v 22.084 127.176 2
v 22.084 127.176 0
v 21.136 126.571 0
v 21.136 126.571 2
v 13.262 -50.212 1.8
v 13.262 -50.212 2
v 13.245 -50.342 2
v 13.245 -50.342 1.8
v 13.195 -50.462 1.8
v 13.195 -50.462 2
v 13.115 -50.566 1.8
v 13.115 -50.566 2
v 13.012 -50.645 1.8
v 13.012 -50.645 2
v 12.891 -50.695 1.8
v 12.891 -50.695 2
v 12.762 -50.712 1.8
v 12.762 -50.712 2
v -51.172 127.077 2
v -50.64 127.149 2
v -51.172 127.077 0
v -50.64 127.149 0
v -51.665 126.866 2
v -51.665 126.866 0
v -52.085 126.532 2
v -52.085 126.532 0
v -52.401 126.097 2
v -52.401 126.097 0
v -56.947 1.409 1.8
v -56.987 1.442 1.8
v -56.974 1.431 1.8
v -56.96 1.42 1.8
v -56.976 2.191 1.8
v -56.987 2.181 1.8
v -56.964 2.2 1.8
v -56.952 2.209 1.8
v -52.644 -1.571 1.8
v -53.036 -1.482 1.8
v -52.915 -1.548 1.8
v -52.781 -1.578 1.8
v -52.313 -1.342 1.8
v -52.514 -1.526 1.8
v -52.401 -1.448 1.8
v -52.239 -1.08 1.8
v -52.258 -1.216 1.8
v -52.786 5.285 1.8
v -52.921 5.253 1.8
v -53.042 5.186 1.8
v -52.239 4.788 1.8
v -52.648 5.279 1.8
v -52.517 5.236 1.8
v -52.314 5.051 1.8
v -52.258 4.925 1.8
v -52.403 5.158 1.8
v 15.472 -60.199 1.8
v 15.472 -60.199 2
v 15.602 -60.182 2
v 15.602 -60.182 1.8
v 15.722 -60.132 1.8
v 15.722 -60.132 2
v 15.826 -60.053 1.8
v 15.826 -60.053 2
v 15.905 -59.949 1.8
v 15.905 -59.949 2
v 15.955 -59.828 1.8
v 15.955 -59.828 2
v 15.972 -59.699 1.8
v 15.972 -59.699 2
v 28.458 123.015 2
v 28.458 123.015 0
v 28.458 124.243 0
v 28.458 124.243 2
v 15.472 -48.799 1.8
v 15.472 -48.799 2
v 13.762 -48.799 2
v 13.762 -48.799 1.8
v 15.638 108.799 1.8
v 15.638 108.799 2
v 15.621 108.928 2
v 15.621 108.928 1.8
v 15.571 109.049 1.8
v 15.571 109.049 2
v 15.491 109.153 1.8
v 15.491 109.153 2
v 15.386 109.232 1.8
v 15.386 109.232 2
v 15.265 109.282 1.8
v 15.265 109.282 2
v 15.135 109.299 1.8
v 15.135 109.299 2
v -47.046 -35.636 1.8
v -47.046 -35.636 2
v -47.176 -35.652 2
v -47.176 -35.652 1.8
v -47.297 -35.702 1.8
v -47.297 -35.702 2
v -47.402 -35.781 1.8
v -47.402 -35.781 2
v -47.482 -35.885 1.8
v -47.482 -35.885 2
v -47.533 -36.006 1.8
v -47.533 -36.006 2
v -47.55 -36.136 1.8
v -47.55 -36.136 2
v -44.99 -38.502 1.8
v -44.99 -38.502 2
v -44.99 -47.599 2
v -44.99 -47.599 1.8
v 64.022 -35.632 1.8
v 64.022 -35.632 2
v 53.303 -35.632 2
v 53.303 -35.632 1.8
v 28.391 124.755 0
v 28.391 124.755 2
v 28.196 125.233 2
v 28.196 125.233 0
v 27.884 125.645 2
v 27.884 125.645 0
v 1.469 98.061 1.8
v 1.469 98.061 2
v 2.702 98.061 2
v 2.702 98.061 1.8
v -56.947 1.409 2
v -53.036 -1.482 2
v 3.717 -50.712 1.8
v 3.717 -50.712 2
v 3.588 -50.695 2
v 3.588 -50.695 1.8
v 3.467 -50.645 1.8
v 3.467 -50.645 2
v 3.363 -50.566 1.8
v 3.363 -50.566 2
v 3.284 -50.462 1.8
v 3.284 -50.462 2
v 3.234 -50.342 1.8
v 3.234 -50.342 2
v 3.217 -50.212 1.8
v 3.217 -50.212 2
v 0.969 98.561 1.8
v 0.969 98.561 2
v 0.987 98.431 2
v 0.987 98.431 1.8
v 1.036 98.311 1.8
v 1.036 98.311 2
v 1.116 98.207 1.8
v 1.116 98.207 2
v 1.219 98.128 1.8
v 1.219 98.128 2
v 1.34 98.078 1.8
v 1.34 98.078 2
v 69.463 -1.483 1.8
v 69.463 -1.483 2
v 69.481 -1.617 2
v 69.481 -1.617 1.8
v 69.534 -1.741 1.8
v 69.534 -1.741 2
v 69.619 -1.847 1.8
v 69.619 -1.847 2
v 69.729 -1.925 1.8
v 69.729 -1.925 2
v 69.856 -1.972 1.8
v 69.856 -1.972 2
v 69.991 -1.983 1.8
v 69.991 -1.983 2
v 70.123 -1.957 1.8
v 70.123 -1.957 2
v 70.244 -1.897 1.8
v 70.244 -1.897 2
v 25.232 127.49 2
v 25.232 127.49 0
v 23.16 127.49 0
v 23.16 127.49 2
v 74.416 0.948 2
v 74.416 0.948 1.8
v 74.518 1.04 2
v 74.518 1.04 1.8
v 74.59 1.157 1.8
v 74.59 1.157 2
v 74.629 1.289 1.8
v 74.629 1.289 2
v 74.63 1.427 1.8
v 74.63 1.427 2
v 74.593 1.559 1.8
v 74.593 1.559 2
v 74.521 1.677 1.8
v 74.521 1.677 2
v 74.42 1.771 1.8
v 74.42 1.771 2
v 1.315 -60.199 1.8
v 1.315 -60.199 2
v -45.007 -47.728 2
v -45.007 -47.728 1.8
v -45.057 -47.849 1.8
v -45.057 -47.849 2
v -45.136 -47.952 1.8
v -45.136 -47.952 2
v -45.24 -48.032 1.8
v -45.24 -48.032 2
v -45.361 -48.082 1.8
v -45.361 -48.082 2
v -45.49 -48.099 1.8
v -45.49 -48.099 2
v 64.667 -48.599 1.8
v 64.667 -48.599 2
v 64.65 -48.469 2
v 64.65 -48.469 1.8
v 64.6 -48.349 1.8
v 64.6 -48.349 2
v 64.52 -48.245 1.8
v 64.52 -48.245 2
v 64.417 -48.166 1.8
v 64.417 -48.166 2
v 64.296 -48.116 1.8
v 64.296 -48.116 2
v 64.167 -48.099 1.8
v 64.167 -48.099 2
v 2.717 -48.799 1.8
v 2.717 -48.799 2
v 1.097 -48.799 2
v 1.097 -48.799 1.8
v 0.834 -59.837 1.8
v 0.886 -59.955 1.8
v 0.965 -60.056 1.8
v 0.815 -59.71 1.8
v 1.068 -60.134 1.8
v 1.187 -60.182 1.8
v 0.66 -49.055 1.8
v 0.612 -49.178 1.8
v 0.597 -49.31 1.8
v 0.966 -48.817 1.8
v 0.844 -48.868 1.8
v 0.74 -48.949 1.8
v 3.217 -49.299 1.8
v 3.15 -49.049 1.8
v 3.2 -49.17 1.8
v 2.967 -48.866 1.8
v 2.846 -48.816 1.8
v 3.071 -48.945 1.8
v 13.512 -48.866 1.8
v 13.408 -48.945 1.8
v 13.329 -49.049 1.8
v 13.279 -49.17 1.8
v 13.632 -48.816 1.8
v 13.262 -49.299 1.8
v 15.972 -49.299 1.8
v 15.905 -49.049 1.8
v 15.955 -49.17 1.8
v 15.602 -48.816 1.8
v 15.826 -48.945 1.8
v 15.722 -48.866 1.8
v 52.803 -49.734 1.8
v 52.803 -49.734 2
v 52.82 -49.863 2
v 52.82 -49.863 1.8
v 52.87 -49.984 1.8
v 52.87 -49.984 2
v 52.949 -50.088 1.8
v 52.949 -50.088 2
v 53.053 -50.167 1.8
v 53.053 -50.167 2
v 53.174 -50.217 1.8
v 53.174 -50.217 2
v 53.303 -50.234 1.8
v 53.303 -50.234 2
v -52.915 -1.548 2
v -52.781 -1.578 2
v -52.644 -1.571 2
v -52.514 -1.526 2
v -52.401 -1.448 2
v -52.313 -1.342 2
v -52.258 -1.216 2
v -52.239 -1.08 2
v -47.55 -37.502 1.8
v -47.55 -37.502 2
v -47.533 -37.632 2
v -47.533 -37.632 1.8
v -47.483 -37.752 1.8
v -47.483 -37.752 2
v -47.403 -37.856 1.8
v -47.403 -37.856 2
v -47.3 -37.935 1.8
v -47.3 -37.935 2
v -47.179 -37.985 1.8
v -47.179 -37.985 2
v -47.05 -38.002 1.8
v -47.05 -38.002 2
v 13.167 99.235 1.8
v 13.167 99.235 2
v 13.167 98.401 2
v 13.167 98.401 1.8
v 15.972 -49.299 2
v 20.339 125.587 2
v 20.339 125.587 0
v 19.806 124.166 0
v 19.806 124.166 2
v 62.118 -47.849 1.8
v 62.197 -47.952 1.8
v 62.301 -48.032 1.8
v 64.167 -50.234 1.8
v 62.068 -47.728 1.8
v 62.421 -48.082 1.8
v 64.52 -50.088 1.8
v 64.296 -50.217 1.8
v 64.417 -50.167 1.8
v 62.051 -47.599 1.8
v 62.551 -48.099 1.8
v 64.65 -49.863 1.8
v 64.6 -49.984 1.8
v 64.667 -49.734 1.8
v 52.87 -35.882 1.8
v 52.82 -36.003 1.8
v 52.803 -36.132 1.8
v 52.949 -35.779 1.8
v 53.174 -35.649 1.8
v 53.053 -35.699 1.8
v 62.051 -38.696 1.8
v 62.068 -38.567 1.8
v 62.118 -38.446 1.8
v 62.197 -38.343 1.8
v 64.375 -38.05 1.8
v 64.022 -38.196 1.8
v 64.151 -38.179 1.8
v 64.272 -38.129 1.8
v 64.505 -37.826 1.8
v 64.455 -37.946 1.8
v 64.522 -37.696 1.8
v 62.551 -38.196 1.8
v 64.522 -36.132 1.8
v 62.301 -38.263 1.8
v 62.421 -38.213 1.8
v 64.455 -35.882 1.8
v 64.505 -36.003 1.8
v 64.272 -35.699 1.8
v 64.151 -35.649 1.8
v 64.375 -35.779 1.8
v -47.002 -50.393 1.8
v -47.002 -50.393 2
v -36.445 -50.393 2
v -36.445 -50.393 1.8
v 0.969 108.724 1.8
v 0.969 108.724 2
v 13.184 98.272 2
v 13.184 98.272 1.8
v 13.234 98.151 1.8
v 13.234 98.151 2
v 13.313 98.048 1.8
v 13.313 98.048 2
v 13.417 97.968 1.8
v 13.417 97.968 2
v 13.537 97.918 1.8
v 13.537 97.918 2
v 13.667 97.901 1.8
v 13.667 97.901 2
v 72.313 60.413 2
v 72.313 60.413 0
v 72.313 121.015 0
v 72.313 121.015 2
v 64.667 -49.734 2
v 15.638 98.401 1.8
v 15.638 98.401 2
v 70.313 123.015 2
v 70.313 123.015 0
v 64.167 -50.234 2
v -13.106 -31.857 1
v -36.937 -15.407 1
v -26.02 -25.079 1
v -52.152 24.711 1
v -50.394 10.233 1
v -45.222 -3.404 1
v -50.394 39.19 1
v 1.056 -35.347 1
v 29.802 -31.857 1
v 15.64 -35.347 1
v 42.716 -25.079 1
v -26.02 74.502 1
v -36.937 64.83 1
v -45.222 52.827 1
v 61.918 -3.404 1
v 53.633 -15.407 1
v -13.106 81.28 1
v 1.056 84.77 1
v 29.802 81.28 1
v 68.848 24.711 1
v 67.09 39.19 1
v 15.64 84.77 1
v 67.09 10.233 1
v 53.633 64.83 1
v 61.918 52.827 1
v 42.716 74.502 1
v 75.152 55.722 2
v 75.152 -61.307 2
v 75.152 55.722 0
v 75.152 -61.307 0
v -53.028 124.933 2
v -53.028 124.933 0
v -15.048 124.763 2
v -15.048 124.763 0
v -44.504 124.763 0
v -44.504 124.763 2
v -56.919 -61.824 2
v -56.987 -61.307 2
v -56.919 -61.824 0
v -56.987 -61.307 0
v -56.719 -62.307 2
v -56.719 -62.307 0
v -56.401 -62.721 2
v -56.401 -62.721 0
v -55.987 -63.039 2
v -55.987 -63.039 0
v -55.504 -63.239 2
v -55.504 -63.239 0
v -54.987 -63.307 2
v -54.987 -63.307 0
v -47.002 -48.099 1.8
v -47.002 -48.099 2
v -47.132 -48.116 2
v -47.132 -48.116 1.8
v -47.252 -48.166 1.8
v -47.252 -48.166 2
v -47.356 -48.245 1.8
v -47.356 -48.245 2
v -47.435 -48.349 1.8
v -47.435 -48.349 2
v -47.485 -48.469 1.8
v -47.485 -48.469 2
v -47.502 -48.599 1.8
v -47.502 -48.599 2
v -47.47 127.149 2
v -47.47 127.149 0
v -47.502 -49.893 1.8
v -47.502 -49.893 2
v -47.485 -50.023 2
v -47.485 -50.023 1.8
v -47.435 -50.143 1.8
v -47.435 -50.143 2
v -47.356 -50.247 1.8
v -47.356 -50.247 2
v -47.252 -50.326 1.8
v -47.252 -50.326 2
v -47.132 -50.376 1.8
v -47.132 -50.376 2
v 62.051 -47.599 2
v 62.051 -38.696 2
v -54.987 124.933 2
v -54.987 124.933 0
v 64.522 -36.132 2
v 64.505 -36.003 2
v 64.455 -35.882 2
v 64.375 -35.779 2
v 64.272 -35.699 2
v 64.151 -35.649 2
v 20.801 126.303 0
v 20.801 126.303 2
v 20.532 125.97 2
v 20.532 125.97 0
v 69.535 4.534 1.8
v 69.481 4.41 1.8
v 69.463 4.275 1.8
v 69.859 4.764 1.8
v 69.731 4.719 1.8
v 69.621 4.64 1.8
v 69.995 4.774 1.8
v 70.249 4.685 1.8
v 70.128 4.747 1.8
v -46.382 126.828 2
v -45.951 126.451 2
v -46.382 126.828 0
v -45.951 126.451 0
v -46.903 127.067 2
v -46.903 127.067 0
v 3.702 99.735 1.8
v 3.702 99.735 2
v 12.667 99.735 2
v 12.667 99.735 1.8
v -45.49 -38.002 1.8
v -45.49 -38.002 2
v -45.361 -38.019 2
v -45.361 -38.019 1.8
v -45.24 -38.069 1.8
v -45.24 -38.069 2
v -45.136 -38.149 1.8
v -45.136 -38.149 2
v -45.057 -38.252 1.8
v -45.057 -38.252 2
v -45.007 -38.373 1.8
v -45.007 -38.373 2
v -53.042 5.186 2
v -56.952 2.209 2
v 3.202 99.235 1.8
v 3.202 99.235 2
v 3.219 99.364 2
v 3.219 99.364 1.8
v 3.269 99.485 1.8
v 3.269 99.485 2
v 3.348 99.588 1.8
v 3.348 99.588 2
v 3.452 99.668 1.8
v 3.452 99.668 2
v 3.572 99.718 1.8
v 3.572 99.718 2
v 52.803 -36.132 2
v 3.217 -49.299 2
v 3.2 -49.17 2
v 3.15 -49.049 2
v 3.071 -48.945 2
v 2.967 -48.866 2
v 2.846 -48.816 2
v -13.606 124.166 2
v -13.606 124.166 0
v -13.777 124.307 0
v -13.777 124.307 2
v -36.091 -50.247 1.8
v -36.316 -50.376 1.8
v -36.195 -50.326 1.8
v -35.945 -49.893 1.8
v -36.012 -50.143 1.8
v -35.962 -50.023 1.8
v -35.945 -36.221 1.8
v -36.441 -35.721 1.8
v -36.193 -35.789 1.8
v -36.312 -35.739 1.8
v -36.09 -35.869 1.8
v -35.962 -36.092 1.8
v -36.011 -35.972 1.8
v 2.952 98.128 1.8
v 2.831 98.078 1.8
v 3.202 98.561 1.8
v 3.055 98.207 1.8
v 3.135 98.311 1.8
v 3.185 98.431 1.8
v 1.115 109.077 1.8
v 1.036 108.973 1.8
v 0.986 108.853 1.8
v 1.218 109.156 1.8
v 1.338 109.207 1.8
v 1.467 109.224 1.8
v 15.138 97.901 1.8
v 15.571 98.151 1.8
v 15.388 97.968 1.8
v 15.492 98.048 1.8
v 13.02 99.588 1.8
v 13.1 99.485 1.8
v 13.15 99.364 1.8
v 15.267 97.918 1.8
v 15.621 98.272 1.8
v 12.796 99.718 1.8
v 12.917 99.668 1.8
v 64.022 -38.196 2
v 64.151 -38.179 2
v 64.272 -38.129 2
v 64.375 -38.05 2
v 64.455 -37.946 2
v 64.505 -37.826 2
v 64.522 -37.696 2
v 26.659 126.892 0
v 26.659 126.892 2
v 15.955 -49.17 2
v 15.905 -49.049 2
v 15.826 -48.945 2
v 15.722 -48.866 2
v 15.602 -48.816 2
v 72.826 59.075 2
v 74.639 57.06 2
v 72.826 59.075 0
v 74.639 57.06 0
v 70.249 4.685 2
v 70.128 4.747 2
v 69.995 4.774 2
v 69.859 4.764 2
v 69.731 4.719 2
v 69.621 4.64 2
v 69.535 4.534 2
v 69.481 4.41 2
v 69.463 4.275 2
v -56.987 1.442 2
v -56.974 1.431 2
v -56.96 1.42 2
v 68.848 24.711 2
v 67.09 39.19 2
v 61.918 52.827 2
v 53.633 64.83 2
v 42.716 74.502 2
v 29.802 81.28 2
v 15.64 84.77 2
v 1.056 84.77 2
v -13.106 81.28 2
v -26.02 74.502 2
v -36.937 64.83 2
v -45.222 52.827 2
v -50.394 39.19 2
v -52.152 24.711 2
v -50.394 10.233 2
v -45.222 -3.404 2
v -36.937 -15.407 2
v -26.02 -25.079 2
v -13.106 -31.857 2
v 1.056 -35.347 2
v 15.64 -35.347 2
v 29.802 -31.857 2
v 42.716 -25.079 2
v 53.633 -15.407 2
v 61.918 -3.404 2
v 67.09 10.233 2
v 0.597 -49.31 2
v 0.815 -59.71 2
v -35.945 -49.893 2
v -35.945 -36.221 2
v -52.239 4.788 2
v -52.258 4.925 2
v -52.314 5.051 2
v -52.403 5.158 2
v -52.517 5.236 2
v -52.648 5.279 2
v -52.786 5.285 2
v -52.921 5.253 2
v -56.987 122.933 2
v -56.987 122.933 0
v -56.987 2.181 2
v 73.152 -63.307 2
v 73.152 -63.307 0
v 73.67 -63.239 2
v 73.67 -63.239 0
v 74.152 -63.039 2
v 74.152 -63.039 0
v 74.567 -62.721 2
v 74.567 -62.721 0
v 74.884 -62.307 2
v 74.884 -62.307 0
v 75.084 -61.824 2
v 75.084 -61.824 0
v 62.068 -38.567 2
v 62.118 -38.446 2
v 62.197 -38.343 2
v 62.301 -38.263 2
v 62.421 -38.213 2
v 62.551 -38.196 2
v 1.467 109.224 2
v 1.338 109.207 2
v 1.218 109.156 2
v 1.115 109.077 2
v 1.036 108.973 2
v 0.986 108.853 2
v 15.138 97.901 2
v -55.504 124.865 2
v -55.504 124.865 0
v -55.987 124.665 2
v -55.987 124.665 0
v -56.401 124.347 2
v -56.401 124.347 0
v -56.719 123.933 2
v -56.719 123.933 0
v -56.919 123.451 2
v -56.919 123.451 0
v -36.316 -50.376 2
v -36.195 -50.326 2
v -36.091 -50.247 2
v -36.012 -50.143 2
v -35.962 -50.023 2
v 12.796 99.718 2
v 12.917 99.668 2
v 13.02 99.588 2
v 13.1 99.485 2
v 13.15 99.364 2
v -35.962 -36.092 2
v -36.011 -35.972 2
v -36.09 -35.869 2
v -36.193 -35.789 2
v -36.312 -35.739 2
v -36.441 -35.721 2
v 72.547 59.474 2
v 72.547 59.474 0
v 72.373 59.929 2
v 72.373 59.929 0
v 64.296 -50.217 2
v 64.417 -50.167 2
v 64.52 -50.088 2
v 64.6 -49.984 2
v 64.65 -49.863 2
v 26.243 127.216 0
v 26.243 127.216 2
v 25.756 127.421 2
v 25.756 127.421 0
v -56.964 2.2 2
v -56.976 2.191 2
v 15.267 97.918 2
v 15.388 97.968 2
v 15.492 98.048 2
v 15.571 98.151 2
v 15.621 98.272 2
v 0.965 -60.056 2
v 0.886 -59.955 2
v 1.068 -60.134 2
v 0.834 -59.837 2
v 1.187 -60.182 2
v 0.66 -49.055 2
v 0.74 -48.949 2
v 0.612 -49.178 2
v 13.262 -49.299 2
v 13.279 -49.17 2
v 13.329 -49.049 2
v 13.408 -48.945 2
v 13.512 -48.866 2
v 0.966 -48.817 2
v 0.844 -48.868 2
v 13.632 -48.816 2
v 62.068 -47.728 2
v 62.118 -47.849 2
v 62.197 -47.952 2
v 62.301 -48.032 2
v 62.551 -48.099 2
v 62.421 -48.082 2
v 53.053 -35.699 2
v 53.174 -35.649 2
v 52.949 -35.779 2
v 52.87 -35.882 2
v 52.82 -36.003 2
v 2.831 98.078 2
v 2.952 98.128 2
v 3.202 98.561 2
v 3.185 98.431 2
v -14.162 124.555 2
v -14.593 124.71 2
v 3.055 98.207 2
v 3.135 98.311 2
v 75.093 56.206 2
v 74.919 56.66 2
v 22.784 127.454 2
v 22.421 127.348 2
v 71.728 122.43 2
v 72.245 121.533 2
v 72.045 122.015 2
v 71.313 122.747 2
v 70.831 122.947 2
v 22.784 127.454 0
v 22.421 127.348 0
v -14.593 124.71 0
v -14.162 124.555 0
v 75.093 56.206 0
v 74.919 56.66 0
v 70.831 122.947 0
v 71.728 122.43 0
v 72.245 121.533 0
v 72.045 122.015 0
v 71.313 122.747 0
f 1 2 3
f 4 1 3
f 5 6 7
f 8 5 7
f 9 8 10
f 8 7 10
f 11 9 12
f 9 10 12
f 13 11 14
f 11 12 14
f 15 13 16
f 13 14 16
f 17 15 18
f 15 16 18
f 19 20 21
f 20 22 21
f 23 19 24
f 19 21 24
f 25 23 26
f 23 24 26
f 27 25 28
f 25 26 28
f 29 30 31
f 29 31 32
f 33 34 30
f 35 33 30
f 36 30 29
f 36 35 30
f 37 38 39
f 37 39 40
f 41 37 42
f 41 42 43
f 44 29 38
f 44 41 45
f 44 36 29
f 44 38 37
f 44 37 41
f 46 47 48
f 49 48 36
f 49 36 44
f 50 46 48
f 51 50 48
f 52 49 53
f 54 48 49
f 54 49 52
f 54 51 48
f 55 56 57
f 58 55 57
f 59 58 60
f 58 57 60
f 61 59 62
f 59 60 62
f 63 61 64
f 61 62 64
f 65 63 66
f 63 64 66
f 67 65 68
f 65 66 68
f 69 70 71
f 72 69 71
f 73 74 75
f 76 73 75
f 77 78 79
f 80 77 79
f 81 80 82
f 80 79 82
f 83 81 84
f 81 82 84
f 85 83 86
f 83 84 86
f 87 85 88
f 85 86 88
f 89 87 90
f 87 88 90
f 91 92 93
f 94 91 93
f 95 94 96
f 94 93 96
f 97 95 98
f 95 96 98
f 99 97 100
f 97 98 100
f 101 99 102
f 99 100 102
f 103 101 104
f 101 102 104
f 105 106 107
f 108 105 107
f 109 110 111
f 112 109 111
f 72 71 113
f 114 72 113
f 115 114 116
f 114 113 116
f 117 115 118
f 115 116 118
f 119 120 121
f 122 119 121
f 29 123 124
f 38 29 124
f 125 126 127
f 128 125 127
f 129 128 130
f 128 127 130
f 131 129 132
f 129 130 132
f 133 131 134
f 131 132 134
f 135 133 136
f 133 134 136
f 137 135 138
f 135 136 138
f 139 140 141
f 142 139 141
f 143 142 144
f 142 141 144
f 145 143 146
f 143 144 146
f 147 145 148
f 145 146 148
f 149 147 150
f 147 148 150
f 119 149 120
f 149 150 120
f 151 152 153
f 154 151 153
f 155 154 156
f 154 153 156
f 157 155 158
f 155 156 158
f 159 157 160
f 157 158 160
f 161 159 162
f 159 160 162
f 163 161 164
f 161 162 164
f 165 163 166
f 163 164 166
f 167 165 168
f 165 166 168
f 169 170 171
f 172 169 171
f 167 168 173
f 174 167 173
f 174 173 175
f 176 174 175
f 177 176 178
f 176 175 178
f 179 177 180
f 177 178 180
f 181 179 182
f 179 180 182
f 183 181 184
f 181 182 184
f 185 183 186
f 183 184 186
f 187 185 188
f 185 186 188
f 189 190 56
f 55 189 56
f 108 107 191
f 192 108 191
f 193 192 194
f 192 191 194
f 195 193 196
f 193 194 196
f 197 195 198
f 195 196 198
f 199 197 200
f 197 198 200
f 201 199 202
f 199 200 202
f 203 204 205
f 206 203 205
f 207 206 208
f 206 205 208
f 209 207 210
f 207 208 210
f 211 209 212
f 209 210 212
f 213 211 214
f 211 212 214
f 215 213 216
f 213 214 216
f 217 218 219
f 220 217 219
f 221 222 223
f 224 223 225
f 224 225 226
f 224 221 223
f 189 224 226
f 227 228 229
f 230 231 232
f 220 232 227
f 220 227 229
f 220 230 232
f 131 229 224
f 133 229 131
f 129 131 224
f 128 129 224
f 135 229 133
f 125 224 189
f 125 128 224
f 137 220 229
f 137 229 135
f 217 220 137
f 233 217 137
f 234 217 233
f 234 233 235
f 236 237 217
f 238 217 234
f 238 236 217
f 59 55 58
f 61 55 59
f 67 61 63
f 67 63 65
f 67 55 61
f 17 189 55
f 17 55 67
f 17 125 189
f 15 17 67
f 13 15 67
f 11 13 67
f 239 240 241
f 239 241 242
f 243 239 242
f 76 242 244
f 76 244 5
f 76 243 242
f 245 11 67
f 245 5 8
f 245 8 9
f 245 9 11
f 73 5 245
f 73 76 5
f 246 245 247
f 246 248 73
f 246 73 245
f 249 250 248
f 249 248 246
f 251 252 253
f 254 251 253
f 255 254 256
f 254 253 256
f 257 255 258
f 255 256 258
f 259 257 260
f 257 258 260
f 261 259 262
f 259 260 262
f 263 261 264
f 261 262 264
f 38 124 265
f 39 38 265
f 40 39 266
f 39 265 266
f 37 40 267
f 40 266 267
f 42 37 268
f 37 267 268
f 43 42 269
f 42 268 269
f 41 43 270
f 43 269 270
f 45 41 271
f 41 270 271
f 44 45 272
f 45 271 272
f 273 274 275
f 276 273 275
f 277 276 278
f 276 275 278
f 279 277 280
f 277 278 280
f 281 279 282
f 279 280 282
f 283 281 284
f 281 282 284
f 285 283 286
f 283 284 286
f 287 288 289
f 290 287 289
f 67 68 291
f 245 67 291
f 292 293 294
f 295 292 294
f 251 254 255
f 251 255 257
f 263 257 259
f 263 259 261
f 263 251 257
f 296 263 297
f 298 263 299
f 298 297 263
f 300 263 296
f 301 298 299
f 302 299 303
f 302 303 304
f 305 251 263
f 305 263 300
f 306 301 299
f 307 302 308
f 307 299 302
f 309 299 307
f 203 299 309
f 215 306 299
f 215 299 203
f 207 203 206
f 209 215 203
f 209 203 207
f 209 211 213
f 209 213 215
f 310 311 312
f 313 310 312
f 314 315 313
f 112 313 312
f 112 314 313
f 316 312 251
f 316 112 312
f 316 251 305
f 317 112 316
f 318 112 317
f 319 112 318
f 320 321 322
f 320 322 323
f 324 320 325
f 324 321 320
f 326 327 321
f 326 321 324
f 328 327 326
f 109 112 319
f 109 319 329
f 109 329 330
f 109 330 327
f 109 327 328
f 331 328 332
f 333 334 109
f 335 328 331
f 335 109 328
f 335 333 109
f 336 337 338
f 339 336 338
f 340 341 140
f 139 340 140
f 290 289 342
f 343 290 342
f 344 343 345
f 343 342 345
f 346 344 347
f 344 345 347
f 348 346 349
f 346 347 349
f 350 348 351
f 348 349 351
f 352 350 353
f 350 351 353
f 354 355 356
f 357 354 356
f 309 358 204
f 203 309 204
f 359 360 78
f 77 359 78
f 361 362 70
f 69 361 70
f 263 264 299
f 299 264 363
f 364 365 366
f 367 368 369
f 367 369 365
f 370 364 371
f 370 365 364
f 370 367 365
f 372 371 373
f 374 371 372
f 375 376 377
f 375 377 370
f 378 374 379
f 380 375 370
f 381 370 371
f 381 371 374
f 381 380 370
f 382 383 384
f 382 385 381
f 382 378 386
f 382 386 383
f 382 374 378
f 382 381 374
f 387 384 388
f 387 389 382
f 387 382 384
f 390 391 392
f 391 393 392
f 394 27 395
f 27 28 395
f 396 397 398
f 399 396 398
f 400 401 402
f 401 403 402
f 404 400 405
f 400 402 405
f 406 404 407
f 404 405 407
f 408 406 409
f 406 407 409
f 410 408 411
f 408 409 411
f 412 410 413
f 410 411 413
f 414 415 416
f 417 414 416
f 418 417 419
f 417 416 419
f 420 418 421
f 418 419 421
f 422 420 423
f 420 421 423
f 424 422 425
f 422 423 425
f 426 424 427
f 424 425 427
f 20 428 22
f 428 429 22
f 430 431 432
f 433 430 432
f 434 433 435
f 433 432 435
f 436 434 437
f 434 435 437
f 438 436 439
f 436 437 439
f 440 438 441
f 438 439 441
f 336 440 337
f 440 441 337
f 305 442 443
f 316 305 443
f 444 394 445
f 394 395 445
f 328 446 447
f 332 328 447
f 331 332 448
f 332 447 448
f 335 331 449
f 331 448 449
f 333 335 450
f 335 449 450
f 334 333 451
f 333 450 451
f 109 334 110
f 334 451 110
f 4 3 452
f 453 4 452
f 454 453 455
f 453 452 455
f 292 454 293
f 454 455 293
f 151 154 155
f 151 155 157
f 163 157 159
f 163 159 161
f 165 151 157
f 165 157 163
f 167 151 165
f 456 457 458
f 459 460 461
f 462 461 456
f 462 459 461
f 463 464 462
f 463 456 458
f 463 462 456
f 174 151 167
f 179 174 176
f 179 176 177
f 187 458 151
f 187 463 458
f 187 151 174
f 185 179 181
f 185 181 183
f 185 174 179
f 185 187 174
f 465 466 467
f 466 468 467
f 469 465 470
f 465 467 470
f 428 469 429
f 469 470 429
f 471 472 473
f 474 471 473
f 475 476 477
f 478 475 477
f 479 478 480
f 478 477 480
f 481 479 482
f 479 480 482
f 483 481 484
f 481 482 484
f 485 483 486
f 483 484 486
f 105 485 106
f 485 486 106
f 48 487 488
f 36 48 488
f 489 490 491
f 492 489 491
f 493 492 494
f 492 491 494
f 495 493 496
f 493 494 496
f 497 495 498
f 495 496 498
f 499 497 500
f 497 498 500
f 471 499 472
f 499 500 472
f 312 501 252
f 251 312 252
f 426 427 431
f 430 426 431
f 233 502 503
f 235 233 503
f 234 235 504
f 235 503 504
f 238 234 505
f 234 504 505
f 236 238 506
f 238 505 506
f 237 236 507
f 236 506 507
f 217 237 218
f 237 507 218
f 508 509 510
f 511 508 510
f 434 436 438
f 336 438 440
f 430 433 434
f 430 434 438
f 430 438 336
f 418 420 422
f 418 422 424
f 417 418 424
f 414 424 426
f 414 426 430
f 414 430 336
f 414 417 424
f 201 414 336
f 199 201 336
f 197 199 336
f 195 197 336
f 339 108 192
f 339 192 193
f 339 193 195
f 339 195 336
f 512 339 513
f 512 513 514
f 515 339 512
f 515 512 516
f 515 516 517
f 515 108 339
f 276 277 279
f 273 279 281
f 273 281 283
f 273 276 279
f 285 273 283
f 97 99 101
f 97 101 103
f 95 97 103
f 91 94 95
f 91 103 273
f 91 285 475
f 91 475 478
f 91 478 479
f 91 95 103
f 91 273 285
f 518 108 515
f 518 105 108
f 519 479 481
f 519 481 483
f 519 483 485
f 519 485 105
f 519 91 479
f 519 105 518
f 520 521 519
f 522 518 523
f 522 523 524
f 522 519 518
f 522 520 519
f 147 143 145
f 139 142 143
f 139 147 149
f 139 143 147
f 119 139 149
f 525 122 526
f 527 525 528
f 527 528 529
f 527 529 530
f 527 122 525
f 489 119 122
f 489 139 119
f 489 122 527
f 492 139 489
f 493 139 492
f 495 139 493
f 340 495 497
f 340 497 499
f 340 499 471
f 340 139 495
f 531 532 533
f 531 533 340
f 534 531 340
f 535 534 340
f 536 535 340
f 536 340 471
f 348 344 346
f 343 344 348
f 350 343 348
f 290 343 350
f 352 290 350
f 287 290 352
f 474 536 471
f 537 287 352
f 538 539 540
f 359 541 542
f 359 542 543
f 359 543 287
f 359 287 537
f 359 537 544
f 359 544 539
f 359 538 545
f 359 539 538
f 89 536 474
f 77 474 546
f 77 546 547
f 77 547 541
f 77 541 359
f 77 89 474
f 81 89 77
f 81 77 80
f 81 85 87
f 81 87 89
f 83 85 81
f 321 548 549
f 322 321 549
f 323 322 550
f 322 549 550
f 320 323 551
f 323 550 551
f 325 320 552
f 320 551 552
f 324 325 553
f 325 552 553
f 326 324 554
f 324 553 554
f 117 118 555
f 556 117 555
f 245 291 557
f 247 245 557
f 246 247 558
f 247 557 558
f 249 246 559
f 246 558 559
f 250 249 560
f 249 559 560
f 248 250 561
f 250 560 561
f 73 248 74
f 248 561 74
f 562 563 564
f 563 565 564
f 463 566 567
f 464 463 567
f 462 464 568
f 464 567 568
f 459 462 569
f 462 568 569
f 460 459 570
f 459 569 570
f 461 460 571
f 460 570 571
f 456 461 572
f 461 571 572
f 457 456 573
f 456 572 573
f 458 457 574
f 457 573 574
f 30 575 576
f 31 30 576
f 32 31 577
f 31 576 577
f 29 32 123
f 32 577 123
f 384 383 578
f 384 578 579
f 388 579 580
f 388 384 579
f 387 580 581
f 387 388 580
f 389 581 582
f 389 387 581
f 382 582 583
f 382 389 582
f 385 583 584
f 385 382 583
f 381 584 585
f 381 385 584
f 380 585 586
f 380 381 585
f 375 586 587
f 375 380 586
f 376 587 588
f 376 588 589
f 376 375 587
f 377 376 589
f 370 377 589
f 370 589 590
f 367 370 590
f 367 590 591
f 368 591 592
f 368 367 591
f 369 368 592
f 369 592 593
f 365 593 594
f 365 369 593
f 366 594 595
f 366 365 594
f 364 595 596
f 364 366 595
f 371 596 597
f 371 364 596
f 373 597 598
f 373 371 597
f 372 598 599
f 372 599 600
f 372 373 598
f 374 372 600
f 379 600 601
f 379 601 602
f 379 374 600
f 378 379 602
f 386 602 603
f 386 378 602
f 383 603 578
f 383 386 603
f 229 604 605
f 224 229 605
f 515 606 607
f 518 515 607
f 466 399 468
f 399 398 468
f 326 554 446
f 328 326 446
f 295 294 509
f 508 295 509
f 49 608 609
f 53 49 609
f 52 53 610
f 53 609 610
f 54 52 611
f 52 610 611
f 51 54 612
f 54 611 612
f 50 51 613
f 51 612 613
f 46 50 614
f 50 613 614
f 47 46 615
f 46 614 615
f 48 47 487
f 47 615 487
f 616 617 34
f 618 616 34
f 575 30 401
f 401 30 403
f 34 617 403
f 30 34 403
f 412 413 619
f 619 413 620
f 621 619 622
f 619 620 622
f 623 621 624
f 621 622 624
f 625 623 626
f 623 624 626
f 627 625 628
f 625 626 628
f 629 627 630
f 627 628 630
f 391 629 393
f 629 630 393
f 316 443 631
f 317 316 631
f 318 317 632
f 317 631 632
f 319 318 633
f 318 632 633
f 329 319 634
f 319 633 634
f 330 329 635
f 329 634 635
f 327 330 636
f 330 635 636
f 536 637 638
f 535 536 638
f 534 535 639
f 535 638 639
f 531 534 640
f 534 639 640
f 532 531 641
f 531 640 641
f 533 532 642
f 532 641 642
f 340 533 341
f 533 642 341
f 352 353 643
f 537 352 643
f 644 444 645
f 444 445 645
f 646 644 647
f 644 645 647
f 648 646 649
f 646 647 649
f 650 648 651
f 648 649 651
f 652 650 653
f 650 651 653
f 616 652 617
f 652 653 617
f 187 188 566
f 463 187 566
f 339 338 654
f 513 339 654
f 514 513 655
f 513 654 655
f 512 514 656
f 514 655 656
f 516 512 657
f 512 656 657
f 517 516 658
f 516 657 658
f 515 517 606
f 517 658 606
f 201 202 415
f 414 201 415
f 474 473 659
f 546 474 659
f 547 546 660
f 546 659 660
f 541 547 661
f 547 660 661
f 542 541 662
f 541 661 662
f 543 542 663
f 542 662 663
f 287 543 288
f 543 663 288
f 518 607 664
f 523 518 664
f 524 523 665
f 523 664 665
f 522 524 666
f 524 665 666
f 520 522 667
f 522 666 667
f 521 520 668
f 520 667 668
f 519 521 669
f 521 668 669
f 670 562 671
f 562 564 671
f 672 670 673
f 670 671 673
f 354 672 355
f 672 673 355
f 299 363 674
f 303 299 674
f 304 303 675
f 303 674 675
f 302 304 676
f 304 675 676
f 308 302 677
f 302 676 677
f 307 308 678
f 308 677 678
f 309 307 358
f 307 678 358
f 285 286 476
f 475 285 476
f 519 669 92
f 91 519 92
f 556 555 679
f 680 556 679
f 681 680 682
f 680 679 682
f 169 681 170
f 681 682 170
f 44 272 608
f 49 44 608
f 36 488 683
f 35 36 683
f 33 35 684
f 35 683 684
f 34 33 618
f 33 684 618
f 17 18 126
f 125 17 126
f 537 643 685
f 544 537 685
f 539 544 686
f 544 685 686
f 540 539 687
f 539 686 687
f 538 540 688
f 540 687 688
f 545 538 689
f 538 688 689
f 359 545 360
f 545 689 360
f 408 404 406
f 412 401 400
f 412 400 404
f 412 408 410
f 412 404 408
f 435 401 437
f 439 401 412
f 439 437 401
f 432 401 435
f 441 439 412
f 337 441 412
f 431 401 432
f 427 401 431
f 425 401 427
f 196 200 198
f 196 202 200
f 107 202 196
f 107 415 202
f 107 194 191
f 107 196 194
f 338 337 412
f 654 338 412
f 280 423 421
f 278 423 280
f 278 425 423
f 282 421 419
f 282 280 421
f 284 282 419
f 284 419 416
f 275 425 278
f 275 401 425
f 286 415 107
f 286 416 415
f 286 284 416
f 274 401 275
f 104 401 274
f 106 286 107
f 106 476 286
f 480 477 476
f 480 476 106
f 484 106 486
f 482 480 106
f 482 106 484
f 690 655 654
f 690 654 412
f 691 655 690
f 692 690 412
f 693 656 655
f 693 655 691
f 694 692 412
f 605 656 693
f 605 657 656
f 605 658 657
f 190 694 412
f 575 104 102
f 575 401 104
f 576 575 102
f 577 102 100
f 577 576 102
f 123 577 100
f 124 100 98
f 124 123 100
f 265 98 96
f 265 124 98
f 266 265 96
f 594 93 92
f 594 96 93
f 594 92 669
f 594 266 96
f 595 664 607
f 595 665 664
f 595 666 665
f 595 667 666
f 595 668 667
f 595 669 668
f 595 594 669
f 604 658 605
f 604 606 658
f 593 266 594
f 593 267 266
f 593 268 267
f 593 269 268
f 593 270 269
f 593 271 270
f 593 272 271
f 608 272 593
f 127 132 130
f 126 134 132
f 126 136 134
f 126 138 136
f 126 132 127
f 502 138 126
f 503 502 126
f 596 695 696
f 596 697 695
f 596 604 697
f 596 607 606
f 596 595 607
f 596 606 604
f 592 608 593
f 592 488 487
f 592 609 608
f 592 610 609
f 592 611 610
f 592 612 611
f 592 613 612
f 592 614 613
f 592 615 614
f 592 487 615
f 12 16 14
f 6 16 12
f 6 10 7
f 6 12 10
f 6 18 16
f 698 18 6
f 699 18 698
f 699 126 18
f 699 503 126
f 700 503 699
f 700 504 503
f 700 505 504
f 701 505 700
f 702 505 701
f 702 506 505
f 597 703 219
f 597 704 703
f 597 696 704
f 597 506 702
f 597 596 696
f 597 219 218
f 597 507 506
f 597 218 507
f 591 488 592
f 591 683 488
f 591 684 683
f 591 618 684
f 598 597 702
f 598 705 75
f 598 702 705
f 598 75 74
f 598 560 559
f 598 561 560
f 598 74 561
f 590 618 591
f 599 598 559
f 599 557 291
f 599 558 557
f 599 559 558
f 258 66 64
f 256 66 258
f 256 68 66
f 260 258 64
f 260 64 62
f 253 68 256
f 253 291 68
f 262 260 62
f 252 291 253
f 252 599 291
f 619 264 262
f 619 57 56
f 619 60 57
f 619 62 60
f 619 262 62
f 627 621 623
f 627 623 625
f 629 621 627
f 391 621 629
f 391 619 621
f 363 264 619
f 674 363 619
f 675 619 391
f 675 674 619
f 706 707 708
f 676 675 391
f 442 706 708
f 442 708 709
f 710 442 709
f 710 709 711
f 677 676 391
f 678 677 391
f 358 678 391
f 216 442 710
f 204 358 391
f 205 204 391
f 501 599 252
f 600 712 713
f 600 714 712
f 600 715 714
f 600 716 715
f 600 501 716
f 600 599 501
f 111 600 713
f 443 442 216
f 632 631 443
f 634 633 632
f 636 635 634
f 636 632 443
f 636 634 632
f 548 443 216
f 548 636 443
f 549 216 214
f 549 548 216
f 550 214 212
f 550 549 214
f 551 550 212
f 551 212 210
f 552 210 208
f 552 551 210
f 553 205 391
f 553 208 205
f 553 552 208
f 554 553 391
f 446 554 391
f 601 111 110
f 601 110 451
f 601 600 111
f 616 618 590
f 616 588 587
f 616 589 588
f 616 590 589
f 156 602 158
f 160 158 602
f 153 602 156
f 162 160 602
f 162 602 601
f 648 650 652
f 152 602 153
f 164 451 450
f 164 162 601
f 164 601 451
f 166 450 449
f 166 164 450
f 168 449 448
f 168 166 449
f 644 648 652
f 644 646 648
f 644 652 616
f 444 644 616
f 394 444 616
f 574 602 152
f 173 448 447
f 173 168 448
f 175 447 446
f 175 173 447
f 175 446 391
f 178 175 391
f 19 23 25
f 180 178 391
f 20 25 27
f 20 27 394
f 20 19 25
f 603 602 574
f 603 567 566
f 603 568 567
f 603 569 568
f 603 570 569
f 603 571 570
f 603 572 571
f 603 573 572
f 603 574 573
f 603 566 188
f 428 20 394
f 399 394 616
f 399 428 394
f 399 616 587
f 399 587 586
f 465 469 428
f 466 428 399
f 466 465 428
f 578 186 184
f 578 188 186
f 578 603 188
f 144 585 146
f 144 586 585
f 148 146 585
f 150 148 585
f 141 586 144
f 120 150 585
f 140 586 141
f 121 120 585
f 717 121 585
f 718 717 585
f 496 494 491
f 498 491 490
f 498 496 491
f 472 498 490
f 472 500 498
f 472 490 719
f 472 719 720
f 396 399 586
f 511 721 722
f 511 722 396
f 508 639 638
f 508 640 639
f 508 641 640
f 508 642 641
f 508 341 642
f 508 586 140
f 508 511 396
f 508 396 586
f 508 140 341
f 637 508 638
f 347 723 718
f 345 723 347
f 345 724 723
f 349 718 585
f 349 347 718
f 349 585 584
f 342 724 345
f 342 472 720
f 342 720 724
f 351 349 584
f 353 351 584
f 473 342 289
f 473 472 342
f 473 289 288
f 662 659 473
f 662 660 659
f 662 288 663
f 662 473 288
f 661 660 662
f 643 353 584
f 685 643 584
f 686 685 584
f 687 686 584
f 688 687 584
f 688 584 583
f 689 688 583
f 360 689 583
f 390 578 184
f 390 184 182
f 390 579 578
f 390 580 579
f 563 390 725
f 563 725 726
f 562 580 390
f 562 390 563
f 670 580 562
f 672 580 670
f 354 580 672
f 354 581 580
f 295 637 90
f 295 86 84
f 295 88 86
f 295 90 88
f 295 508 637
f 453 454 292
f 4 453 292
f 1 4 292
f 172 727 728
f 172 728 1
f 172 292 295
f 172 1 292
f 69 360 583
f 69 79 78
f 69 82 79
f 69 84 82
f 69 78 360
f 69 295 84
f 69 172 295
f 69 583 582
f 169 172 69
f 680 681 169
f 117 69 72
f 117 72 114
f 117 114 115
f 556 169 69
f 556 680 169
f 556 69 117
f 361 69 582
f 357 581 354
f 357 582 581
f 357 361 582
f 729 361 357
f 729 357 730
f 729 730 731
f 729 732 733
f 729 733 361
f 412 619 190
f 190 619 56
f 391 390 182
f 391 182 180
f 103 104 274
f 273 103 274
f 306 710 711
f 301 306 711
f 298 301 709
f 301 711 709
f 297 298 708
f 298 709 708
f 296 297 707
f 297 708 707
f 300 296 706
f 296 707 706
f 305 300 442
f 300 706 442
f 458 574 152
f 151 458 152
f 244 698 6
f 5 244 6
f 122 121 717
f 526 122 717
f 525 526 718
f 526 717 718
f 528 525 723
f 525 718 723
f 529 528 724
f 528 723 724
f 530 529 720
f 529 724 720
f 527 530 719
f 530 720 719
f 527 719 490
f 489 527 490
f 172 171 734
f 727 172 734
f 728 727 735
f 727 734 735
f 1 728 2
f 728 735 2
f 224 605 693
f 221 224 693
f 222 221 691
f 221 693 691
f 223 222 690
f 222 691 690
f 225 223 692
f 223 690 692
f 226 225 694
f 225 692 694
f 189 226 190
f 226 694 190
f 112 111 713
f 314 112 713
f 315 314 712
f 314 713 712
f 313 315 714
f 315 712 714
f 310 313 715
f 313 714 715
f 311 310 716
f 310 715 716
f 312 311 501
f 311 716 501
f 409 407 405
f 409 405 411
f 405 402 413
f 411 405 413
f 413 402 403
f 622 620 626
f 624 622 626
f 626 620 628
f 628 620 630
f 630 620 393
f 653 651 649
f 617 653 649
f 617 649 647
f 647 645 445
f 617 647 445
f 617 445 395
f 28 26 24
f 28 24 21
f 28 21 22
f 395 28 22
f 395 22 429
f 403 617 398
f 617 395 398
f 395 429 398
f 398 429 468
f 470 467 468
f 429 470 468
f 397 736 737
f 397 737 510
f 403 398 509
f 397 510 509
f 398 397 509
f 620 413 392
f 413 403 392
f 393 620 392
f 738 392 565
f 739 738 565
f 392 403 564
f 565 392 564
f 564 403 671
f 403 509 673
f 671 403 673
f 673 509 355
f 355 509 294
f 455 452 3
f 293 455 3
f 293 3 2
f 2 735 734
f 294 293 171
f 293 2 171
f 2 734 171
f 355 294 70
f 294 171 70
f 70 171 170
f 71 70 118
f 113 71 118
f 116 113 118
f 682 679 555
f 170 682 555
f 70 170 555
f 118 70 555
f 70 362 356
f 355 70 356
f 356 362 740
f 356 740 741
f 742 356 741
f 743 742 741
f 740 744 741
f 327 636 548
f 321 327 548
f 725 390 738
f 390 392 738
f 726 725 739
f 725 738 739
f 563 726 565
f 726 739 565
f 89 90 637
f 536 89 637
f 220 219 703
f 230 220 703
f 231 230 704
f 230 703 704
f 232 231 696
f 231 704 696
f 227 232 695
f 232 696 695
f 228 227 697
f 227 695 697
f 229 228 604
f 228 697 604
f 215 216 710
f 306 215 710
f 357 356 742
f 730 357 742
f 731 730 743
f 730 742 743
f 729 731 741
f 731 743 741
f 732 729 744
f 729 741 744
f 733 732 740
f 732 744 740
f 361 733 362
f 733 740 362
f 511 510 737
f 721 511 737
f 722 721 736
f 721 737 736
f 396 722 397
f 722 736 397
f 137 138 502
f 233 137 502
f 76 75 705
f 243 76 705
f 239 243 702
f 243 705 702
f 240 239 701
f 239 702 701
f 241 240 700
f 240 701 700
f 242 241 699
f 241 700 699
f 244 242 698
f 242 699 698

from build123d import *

# Parameters (mm, degrees)
F1_DEPTH = 1
F2_R     = 60.5
F3_DEPTH = 1
F5_DEPTH = 0.2


with BuildPart() as f1:
    # F0 (on Top) → F1 (new body)
    with BuildSketch(Plane.XY):
        with BuildLine():
            Line((-53.027665, 124.93312), (-54.98666, 124.93312))
            ThreePointArc((-54.98666, 124.93312), (-56.400873, 124.347334), (-56.98666, 122.93312))
            Line((-56.98666, 122.93312), (-56.98666, -61.30676))
            ThreePointArc((-56.98666, -61.30676), (-56.400873, -62.720974), (-54.98666, -63.30676))
            Line((-54.98666, -63.30676), (73.152434, -63.30676))
            ThreePointArc((73.152434, -63.30676), (74.566648, -62.720974), (75.152434, -61.30676))
            Line((75.152434, -61.30676), (75.152434, 55.722097))
            ThreePointArc((75.152434, 55.722097), (75.019783, 56.438345), (74.639423, 57.059581))
            Line((74.639423, 57.059581), (72.826351, 59.075319))
            ThreePointArc((72.826351, 59.075319), (72.445992, 59.696556), (72.31334, 60.412804))
            Line((72.31334, 60.412804), (72.31334, 121.015311))
            ThreePointArc((72.31334, 121.015311), (71.727554, 122.429524), (70.31334, 123.015311))
            Line((70.31334, 123.015311), (28.457738, 123.015311))
            Line((28.457738, 123.015311), (28.457738, 124.242901))
            ThreePointArc((28.457738, 124.242901), (28.308866, 125.000085), (27.884411, 125.644545))
            Line((27.884411, 125.644545), (26.658998, 126.89184))
            ThreePointArc((26.658998, 126.89184), (26.00586, 127.334551), (25.232325, 127.490196))
            Line((25.232325, 127.490196), (23.160365, 127.490196))
            ThreePointArc((23.160365, 127.490196), (22.59987, 127.410052), (22.084295, 127.176042))
            Line((22.084295, 127.176042), (21.135774, 126.570603))
            ThreePointArc((21.135774, 126.570603), (20.657619, 126.143481), (20.339185, 125.587005))
            Line((20.339185, 125.587005), (19.806307, 124.165993))
            Line((19.806307, 124.165993), (-13.606119, 124.165993))
            Line((-13.606119, 124.165993), (-13.776735, 124.306503))
            ThreePointArc((-13.776735, 124.306503), (-14.372773, 124.645163), (-15.04816, 124.762651))
            Line((-15.04816, 124.762651), (-44.504093, 124.762651))
            Line((-44.504093, 124.762651), (-45.951107, 126.450838))
            ThreePointArc((-45.951107, 126.450838), (-46.633907, 126.966283), (-47.469622, 127.149258))
            Line((-47.469622, 127.149258), (-50.639777, 127.149258))
            ThreePointArc((-50.639777, 127.149258), (-51.665353, 126.866289), (-52.400722, 126.097452))
            Line((-52.400722, 126.097452), (-53.027665, 124.93312))
        make_face()
    extrude(amount=F1_DEPTH)

    # F2 (on face) → F3 (join)
    with BuildSketch(Plane.XY.offset(1)):
        with BuildLine():
            Line((-15.04816, 124.762651), (-44.504093, 124.762651))
            Line((-44.504093, 124.762651), (-45.951107, 126.450838))
            ThreePointArc((-45.951107, 126.450838), (-46.633907, 126.966283), (-47.469622, 127.149258))
            Line((-47.469622, 127.149258), (-50.639777, 127.149258))
            ThreePointArc((-50.639777, 127.149258), (-51.665353, 126.866289), (-52.400722, 126.097452))
            Line((-52.400722, 126.097452), (-53.027665, 124.93312))
            Line((-53.027665, 124.93312), (-54.98666, 124.93312))
            ThreePointArc((-54.98666, 124.93312), (-56.400873, 124.347334), (-56.98666, 122.93312))
            Line((-56.98666, 122.93312), (-56.98666, -61.30676))
            ThreePointArc((-56.98666, -61.30676), (-56.400873, -62.720974), (-54.98666, -63.30676))
            Line((-54.98666, -63.30676), (73.152434, -63.30676))
            ThreePointArc((73.152434, -63.30676), (74.566648, -62.720974), (75.152434, -61.30676))
            Line((75.152434, -61.30676), (75.152434, 55.722097))
            ThreePointArc((75.152434, 55.722097), (75.019783, 56.438345), (74.639423, 57.059581))
            Line((74.639423, 57.059581), (72.826351, 59.075319))
            ThreePointArc((72.826351, 59.075319), (72.445992, 59.696556), (72.31334, 60.412804))
            Line((72.31334, 60.412804), (72.31334, 121.015311))
            ThreePointArc((72.31334, 121.015311), (71.727554, 122.429524), (70.31334, 123.015311))
            Line((70.31334, 123.015311), (28.457738, 123.015311))
            Line((28.457738, 123.015311), (28.457738, 124.242901))
            ThreePointArc((28.457738, 124.242901), (28.308866, 125.000085), (27.884411, 125.644545))
            Line((27.884411, 125.644545), (26.658998, 126.89184))
            ThreePointArc((26.658998, 126.89184), (26.00586, 127.334551), (25.232325, 127.490196))
            Line((25.232325, 127.490196), (23.160365, 127.490196))
            ThreePointArc((23.160365, 127.490196), (22.59987, 127.410052), (22.084295, 127.176042))
            Line((22.084295, 127.176042), (21.135774, 126.570603))
            ThreePointArc((21.135774, 126.570603), (20.657619, 126.143481), (20.339185, 125.587005))
            Line((20.339185, 125.587005), (19.806307, 124.165993))
            Line((19.806307, 124.165993), (-13.606119, 124.165993))
            Line((-13.606119, 124.165993), (-13.776735, 124.306503))
            ThreePointArc((-13.776735, 124.306503), (-14.372773, 124.645163), (-15.04816, 124.762651))
        make_face()
        with Locations((8.348013, 24.711499)):
            Circle(F2_R, mode=Mode.SUBTRACT)
    extrude(amount=F3_DEPTH)

    # F4 (on face) → F5 (cut)
    with BuildSketch(Plane.XY.offset(2)):
        with BuildLine():
            ThreePointArc((-47.045743, -35.636087), (-47.40188, -35.781107), (-47.549743, -36.136071))
            Line((-47.549743, -36.136071), (-47.549743, -37.502152))
            ThreePointArc((-47.549743, -37.502152), (-47.403297, -37.855705), (-47.049743, -38.002152))
            Line((-47.049743, -38.002152), (-45.490037, -38.002152))
            ThreePointArc((-45.490037, -38.002152), (-45.136483, -38.148599), (-44.990037, -38.502152))
            Line((-44.990037, -38.502152), (-44.990037, -47.598776))
            ThreePointArc((-44.990037, -47.598776), (-45.136483, -47.95233), (-45.490037, -48.098776))
            Line((-45.490037, -48.098776), (-47.002343, -48.098776))
            ThreePointArc((-47.002343, -48.098776), (-47.355896, -48.245223), (-47.502343, -48.598776))
            Line((-47.502343, -48.598776), (-47.502343, -49.893432))
            ThreePointArc((-47.502343, -49.893432), (-47.355896, -50.246986), (-47.002343, -50.393432))
            Line((-47.002343, -50.393432), (-36.445047, -50.393432))
            ThreePointArc((-36.445047, -50.393432), (-36.091493, -50.246986), (-35.945047, -49.893432))
            Line((-35.945047, -49.893432), (-35.945047, -36.220909))
            ThreePointArc((-35.945047, -36.220909), (-36.090082, -35.868773), (-36.441047, -35.720925))
            Line((-36.441047, -35.720925), (-47.045743, -35.636087))
        make_face()
        with BuildLine():
            Line((2.716971, -48.799027), (1.096801, -48.799027))
            ThreePointArc((1.096801, -48.799027), (0.739559, -48.949201), (0.596911, -49.309514))
            Line((0.596911, -49.309514), (0.815092, -59.709521))
            ThreePointArc((0.815092, -59.709521), (0.965156, -60.056275), (1.314982, -60.199033))
            Line((1.314982, -60.199033), (15.472221, -60.199033))
            ThreePointArc((15.472221, -60.199033), (15.825775, -60.052587), (15.972221, -59.699033))
            Line((15.972221, -59.699033), (15.972221, -49.299027))
            ThreePointArc((15.972221, -49.299027), (15.825775, -48.945473), (15.472221, -48.799027))
            Line((15.472221, -48.799027), (13.761731, -48.799027))
            ThreePointArc((13.761731, -48.799027), (13.408177, -48.945473), (13.261731, -49.299027))
            Line((13.261731, -49.299027), (13.261731, -50.212314))
            ThreePointArc((13.261731, -50.212314), (13.115284, -50.565867), (12.761731, -50.712314))
            Line((12.761731, -50.712314), (3.716971, -50.712314))
            ThreePointArc((3.716971, -50.712314), (3.363418, -50.565867), (3.216971, -50.212314))
            Line((3.216971, -50.212314), (3.216971, -49.299027))
            ThreePointArc((3.216971, -49.299027), (3.070525, -48.945473), (2.716971, -48.799027))
        make_face()
        with BuildLine():
            ThreePointArc((53.303006, -35.632055), (52.949453, -35.778502), (52.803006, -36.132055))
            Line((52.803006, -36.132055), (52.803006, -49.733994))
            ThreePointArc((52.803006, -49.733994), (52.949453, -50.087547), (53.303006, -50.233994))
            Line((53.303006, -50.233994), (64.16683, -50.233994))
            ThreePointArc((64.16683, -50.233994), (64.520383, -50.087547), (64.66683, -49.733994))
            Line((64.66683, -49.733994), (64.66683, -48.598776))
            ThreePointArc((64.66683, -48.598776), (64.520383, -48.245223), (64.16683, -48.098776))
            Line((64.16683, -48.098776), (62.550562, -48.098776))
            ThreePointArc((62.550562, -48.098776), (62.197009, -47.95233), (62.050562, -47.598776))
            Line((62.050562, -47.598776), (62.050562, -38.696225))
            ThreePointArc((62.050562, -38.696225), (62.197009, -38.342671), (62.550562, -38.196225))
            Line((62.550562, -38.196225), (64.021894, -38.196225))
            ThreePointArc((64.021894, -38.196225), (64.375447, -38.049778), (64.521894, -37.696225))
            Line((64.521894, -37.696225), (64.521894, -36.132055))
            ThreePointArc((64.521894, -36.132055), (64.375447, -35.778502), (64.021894, -35.632055))
            Line((64.021894, -35.632055), (53.303006, -35.632055))
        make_face()
        with BuildLine():
            ThreePointArc((70.248886, 4.685054), (69.731416, 4.718573), (69.462516, 4.275186))
            Line((69.462516, 4.275186), (69.462516, -1.483415))
            ThreePointArc((69.462516, -1.483415), (69.728887, -1.925475), (70.244185, -1.896529))
            Line((70.244185, -1.896529), (74.415556, 0.94759))
            ThreePointArc((74.415556, 0.94759), (74.63388, 1.357847), (74.420258, 1.770572))
            Line((74.420258, 1.770572), (70.248886, 4.685054))
        make_face()
        with BuildLine():
            Line((-53.041739, 5.185619), (-56.952399, 2.209391))
            ThreePointArc((-56.952399, 2.209391), (-57.14958, 1.808048), (-56.946856, 1.409475))
            Line((-56.946856, 1.409475), (-53.036195, -1.482046))
            ThreePointArc((-53.036195, -1.482046), (-52.5138, -1.526457), (-52.238931, -1.080008))
            Line((-52.238931, -1.080008), (-52.238931, 4.78774))
            ThreePointArc((-52.238931, 4.78774), (-52.516899, 5.235738), (-53.041739, 5.185619))
        make_face()
        with BuildLine():
            ThreePointArc((1.466782, 109.224265), (1.114987, 109.076864), (0.969499, 108.724273))
            Line((0.969499, 108.724273), (0.969499, 98.56072))
            ThreePointArc((0.969499, 98.56072), (1.115946, 98.207166), (1.469499, 98.06072))
            Line((1.469499, 98.06072), (2.701668, 98.06072))
            ThreePointArc((2.701668, 98.06072), (3.055221, 98.207166), (3.201668, 98.56072))
            Line((3.201668, 98.56072), (3.201668, 99.234843))
            ThreePointArc((3.201668, 99.234843), (3.348114, 99.588396), (3.701668, 99.734843))
            Line((3.701668, 99.734843), (12.666707, 99.734843))
            ThreePointArc((12.666707, 99.734843), (13.02026, 99.588396), (13.166707, 99.234843))
            Line((13.166707, 99.234843), (13.166707, 98.401277))
            ThreePointArc((13.166707, 98.401277), (13.313154, 98.047724), (13.666707, 97.901277))
            Line((13.666707, 97.901277), (15.138037, 97.901277))
            ThreePointArc((15.138037, 97.901277), (15.49159, 98.047724), (15.638037, 98.401277))
            Line((15.638037, 98.401277), (15.638037, 108.798559))
            ThreePointArc((15.638037, 108.798559), (15.490628, 109.153072), (15.135319, 109.298552))
            Line((15.135319, 109.298552), (1.466782, 109.224265))
        make_face()
    extrude(amount=-F5_DEPTH, mode=Mode.SUBTRACT)


solid = f1.part
